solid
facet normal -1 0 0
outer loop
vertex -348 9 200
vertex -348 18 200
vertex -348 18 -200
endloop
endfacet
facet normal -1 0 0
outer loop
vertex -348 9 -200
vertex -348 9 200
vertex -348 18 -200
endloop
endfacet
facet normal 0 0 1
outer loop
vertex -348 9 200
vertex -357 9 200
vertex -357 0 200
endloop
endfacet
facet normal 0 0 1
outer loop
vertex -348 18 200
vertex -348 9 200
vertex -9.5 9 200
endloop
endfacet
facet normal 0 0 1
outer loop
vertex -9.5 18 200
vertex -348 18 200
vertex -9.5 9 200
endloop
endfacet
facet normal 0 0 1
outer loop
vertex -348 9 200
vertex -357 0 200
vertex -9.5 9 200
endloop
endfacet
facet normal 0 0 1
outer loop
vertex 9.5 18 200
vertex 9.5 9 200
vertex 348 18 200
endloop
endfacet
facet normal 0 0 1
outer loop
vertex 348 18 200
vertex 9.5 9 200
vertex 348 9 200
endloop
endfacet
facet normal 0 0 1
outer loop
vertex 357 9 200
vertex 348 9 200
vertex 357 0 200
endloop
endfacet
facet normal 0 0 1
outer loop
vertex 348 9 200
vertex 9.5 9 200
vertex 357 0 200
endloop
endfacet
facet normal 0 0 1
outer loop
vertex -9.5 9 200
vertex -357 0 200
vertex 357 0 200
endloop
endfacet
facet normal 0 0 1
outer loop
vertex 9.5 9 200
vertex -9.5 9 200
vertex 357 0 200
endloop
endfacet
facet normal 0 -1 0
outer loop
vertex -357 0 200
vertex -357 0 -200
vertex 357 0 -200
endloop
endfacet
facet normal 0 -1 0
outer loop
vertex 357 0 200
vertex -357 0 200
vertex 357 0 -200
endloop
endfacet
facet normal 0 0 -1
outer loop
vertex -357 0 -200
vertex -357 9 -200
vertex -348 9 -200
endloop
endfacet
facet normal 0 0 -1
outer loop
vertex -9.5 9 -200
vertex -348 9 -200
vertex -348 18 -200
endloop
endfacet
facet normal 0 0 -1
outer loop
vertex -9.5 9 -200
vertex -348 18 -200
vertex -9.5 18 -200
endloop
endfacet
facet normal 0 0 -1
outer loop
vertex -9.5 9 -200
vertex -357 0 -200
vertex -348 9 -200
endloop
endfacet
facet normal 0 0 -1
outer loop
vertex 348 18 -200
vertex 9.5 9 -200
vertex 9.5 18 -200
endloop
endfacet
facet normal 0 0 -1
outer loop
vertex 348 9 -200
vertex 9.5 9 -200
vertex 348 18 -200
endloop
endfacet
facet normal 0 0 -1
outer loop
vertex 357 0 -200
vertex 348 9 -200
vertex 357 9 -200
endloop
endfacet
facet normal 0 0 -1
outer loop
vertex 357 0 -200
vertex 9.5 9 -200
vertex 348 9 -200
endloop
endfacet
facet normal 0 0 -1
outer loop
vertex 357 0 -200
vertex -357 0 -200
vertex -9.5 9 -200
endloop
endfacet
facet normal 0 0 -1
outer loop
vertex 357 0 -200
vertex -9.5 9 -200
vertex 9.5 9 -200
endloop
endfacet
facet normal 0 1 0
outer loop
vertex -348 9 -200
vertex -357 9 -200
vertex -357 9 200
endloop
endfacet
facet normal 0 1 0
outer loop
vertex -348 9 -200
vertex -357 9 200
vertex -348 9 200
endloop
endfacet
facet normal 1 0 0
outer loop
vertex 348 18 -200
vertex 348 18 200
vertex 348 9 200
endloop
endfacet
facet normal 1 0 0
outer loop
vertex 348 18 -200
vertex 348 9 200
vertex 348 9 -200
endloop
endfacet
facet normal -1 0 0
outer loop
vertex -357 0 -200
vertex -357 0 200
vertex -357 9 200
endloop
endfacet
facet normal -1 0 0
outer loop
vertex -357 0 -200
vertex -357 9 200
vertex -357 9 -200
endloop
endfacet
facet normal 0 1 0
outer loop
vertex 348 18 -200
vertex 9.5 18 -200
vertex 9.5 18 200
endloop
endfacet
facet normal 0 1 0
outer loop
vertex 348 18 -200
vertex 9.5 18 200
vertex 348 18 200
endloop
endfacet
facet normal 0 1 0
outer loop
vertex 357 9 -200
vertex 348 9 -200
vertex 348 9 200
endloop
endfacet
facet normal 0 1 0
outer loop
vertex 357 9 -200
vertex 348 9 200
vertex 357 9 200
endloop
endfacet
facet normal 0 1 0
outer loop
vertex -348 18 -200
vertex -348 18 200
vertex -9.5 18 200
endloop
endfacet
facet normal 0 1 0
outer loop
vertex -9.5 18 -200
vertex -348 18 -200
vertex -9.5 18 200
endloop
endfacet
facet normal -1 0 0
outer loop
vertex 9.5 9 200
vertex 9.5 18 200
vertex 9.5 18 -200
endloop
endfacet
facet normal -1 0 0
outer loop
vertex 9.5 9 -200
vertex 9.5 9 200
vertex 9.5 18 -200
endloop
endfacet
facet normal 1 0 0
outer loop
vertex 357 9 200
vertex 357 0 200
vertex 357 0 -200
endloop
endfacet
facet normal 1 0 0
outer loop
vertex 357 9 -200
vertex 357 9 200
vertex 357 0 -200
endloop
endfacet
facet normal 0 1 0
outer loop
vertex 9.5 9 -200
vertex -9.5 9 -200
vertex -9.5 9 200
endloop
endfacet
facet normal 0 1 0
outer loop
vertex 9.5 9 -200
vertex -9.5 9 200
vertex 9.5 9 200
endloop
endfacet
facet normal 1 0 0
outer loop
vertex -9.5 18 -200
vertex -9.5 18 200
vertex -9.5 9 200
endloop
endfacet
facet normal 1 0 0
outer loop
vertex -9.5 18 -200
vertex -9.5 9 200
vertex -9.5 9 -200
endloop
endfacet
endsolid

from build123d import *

# Parameters (mm, degrees)
SKETCH1_W           = 714
SKETCH1_H           = 400
BOSS_EXTRUDE1_DEPTH = 18
SKETCH2_W           = 9
SKETCH2_H           = 400
CUT_EXTRUDE1_DEPTH  = 9
SKETCH3_W           = 19
SKETCH3_H           = 400
CUT_EXTRUDE2_DEPTH  = 9


with BuildPart() as part:
    # Sketch1 → Boss-Extrude1 (new body)
    with BuildSketch(Plane(origin=(0, 0, 0), x_dir=(1, 0, 0), z_dir=(0, 1, 0))):
        Rectangle(SKETCH1_W, SKETCH1_H)
    extrude(amount=BOSS_EXTRUDE1_DEPTH)

    # Sketch2 → Cut-Extrude1 (cut)
    with BuildSketch(Plane(origin=(0, 18, 0), x_dir=(1, 0, 0), z_dir=(0, 1, 0))):
        with Locations((352.5, 0)):
            Rectangle(SKETCH2_W, SKETCH2_H)
        with Locations((-352.5, 0)):
            Rectangle(SKETCH2_W, SKETCH2_H)
    extrude(amount=-CUT_EXTRUDE1_DEPTH, mode=Mode.SUBTRACT)

    # Sketch3 → Cut-Extrude2 (cut)
    with BuildSketch(Plane(origin=(0, 18, 0), x_dir=(1, 0, 0), z_dir=(0, 1, 0))):
        Rectangle(SKETCH3_W, SKETCH3_H)
    extrude(amount=-CUT_EXTRUDE2_DEPTH, mode=Mode.SUBTRACT)


solid = part.part
